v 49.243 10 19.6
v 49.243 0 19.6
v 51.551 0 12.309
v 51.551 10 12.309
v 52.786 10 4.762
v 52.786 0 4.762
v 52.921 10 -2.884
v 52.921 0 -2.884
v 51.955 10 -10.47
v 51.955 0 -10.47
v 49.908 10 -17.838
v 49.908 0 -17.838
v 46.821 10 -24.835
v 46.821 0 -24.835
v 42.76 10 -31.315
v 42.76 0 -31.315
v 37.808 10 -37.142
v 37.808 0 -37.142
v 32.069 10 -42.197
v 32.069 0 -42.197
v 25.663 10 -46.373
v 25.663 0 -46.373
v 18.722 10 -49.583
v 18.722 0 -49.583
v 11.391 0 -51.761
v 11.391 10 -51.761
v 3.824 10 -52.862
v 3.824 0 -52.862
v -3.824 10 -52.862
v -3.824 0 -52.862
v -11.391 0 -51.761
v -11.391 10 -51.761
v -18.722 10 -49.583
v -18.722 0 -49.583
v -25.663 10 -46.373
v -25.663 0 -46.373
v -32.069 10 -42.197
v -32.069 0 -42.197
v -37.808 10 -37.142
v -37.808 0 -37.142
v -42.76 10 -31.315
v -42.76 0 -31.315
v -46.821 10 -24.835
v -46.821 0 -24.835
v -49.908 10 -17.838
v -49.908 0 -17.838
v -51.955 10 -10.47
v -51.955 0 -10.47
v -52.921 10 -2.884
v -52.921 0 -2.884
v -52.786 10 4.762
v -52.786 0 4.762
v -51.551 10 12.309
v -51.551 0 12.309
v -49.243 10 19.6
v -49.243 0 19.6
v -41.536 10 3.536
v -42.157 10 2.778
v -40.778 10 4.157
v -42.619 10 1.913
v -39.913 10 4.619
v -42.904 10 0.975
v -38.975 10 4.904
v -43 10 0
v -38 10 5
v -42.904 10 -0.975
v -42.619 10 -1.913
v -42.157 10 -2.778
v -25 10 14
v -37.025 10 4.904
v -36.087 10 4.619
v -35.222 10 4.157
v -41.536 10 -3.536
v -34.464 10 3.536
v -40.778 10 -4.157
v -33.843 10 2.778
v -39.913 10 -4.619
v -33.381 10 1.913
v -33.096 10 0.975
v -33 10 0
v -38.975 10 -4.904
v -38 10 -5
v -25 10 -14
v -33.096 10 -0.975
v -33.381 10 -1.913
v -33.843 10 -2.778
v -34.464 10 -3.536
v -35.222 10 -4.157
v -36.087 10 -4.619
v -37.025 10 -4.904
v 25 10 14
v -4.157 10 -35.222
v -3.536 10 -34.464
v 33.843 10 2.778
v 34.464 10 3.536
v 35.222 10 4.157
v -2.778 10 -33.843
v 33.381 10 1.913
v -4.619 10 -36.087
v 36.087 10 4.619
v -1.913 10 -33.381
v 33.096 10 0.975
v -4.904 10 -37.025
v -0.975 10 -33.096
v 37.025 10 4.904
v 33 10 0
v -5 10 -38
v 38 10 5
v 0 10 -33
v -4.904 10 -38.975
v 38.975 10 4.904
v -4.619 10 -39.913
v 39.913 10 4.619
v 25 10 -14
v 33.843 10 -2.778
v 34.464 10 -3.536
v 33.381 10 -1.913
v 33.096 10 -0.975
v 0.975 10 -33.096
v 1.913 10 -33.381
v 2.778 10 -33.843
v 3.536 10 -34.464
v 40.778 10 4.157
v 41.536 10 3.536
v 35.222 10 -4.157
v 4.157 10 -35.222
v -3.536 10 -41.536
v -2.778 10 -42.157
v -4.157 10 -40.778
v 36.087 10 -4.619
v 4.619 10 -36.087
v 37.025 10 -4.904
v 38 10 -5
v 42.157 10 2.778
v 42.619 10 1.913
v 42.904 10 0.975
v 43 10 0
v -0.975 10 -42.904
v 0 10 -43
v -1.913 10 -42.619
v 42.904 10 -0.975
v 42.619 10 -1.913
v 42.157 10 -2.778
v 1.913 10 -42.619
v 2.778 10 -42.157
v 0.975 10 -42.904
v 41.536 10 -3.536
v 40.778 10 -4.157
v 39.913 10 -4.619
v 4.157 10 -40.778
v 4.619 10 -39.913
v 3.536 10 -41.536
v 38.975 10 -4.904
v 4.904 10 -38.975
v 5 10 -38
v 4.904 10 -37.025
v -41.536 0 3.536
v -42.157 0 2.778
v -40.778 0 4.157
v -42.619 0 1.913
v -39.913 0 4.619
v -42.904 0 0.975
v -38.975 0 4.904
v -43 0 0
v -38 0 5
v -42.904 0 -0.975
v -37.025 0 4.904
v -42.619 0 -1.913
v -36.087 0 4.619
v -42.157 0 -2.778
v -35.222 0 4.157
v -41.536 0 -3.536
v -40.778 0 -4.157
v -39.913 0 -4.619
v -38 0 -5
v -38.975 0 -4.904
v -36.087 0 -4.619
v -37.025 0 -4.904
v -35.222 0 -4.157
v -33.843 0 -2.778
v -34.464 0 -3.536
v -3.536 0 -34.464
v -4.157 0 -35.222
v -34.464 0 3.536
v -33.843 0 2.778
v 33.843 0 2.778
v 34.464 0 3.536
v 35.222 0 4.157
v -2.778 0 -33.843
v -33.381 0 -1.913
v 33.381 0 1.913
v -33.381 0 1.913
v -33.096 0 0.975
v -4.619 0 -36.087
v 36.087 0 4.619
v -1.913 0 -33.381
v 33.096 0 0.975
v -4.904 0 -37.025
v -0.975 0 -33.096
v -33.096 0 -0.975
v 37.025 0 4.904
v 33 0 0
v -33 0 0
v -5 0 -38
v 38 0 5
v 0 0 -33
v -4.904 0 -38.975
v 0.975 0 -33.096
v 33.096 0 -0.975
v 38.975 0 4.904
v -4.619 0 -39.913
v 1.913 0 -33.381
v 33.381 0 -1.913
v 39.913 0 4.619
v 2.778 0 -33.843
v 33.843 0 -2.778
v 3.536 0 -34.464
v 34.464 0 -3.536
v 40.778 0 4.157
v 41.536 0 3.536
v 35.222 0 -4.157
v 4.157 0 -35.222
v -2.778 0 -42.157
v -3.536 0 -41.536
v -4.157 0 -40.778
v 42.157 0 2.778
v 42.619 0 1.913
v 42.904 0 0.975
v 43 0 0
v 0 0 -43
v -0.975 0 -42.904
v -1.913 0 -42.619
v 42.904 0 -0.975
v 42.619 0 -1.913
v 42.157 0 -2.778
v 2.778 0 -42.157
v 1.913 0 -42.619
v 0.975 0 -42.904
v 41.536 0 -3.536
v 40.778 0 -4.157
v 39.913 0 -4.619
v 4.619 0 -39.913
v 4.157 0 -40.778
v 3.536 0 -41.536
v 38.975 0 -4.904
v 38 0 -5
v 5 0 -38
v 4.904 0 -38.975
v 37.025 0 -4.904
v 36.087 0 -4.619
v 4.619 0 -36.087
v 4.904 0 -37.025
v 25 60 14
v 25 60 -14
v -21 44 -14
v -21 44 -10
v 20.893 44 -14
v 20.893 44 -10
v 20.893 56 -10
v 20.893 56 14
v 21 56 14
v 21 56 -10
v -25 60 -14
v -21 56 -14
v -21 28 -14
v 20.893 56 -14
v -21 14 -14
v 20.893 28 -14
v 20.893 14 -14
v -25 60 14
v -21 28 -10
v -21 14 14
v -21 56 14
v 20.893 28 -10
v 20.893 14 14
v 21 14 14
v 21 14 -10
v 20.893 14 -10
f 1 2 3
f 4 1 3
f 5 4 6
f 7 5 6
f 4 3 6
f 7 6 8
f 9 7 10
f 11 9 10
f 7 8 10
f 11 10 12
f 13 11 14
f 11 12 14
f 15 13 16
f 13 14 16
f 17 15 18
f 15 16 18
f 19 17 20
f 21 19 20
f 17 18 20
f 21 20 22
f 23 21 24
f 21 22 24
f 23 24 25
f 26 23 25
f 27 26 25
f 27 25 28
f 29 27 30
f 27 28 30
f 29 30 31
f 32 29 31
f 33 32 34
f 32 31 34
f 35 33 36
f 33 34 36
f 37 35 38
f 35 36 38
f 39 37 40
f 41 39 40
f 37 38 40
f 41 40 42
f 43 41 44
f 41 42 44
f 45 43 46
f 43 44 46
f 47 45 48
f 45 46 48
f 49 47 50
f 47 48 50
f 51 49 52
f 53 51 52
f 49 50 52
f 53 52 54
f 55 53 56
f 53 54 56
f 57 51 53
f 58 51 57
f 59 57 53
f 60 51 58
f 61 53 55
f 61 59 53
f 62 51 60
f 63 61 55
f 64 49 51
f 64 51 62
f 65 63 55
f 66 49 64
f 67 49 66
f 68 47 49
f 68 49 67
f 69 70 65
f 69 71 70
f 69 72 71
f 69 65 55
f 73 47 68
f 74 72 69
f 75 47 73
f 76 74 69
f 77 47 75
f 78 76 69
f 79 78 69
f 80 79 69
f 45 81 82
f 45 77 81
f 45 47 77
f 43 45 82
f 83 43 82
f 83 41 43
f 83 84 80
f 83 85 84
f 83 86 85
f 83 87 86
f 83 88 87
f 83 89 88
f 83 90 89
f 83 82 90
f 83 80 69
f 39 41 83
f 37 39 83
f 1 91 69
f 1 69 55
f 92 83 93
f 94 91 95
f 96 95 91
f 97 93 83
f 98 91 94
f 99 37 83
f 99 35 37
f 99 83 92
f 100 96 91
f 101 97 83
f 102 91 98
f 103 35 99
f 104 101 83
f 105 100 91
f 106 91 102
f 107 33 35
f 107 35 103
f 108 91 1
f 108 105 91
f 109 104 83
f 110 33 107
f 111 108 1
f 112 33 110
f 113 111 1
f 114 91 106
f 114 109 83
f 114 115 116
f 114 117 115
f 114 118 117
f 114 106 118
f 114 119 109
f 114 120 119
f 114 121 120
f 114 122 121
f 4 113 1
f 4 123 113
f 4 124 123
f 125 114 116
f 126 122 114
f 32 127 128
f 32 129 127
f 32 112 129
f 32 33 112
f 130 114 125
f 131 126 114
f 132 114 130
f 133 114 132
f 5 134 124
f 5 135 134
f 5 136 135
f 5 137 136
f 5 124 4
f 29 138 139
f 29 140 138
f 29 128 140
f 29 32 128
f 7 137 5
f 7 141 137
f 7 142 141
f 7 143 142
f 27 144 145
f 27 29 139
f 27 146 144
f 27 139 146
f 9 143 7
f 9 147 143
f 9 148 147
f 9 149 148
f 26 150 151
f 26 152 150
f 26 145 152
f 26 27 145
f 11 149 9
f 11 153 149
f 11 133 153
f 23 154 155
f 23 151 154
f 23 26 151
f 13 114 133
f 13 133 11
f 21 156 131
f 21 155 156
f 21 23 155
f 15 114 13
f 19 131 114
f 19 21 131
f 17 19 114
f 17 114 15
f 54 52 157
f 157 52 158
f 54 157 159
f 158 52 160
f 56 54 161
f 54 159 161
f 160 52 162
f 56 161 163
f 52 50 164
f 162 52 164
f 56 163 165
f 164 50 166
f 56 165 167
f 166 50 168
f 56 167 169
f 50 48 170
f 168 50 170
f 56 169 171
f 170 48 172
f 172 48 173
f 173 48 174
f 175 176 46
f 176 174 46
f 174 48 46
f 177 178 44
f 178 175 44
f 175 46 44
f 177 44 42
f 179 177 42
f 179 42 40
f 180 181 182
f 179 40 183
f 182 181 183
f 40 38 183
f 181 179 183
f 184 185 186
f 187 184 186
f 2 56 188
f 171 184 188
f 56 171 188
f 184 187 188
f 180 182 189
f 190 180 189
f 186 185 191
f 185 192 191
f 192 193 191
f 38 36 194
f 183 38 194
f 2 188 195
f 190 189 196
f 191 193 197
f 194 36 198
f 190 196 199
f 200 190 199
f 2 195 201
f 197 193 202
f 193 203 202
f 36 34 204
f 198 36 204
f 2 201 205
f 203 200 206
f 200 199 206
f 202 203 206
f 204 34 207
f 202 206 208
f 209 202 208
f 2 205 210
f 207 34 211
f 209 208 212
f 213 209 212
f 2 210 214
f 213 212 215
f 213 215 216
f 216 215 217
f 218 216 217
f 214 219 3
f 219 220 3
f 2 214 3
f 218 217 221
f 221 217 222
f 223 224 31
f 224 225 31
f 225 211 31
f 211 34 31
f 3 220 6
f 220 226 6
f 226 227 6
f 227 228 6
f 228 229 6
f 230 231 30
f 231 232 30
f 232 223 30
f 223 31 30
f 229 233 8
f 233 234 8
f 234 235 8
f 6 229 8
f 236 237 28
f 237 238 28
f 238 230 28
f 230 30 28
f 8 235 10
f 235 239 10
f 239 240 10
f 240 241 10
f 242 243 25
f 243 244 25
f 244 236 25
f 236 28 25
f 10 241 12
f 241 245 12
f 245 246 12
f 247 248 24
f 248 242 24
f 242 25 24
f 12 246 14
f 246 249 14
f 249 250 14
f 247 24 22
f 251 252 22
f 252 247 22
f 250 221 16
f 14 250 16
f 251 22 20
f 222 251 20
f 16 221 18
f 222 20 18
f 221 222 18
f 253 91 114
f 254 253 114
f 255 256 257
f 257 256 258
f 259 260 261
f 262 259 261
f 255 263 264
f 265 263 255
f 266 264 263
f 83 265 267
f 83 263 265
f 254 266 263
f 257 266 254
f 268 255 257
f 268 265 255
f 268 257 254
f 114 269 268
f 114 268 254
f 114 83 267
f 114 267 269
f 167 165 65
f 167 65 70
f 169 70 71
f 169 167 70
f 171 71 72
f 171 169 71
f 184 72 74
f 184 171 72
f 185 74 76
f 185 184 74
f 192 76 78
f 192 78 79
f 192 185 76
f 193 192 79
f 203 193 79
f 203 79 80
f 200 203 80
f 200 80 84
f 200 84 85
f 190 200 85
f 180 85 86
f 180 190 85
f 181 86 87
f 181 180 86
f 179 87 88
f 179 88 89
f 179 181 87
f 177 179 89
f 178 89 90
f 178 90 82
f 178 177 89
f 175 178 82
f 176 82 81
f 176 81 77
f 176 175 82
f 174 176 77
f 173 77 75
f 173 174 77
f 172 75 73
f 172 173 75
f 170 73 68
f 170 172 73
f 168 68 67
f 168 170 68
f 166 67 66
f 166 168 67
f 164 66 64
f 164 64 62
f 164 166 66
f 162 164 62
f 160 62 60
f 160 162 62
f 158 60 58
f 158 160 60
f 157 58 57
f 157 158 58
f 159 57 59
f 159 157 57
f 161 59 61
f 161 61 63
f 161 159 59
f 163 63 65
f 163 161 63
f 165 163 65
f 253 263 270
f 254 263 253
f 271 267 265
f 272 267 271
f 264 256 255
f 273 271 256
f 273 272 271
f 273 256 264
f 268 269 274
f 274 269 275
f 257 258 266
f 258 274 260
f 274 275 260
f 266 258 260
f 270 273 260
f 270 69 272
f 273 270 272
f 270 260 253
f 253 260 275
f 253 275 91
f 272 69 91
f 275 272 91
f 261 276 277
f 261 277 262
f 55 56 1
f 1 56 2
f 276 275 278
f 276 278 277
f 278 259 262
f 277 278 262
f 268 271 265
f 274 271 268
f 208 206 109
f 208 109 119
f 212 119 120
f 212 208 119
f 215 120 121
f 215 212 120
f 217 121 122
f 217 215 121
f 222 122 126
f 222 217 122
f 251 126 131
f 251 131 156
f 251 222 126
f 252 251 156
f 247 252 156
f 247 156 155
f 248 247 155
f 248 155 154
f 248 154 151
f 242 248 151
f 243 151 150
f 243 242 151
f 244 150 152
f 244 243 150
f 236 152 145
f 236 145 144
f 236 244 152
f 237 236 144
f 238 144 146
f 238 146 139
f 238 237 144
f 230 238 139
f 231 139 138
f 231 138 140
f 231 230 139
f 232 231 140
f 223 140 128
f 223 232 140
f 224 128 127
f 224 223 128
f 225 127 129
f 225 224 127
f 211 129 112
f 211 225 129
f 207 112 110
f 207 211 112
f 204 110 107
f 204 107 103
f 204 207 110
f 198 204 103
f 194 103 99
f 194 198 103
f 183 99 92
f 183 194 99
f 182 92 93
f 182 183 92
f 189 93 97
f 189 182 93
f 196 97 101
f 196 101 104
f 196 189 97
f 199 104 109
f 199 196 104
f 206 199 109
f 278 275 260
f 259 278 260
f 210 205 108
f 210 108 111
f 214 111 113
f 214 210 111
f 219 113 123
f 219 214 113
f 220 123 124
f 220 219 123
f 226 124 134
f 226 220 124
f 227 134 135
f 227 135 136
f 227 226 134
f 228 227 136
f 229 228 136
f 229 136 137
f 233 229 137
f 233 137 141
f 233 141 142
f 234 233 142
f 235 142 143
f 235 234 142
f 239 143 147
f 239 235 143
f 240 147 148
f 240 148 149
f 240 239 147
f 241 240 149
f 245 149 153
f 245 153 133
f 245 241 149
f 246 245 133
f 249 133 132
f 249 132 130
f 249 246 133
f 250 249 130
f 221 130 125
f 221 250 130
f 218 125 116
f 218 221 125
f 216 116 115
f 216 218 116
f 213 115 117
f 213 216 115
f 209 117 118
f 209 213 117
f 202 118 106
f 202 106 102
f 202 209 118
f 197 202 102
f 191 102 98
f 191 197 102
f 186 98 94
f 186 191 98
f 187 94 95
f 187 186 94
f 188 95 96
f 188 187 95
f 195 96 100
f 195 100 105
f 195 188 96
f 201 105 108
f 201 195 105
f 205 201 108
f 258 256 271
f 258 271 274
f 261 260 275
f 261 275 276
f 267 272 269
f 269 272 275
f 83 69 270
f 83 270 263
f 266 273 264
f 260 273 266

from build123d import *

# Parameters (mm, degrees)
SKETCH1_R           = 5
BOSS_EXTRUDE4_DEPTH = 10
SKETCH5_W           = 50
SKETCH5_H           = 28
BOSS_EXTRUDE5_DEPTH = 50
SKETCH6_W           = 42
SKETCH6_H           = 42
BOSS_EXTRUDE7_DEPTH = 24
SKETCH9_W           = 41.892865088
SKETCH9_H           = 42
CUT_EXTRUDE1_DEPTH  = 24
SKETCH10_W          = 41.892865088
SKETCH10_H          = 12
CUT_EXTRUDE6_DEPTH  = 4
SKETCH11_W          = 41.892865088
SKETCH11_H          = 14
CUT_EXTRUDE7_DEPTH  = 4


with BuildPart() as part:
    # Sketch1 → Boss-Extrude4 (new body)
    with BuildSketch(Plane(origin=(0, 0, 0), x_dir=(1, 0, 0), z_dir=(0, 1, 0))):
        with BuildLine():
            Line((-49.242854308, -19.599522943), (49.242854308, -19.599522943))
            ThreePointArc((49.242854308, -19.599522943), (0, 53), (-49.242854308, -19.599522943))
        make_face()
        with Locations(Location((-38, 0, 0), (0, 0, 270))):
            Circle(SKETCH1_R, mode=Mode.SUBTRACT)
        with Locations(Location((38, 0, 0), (0, 0, 270))):
            Circle(SKETCH1_R, mode=Mode.SUBTRACT)
        with Locations(Location((0, 38, 0), (0, 0, 270))):
            Circle(SKETCH1_R, mode=Mode.SUBTRACT)
    extrude(amount=BOSS_EXTRUDE4_DEPTH)

    # Sketch5 → Boss-Extrude5 (add)
    with BuildSketch(Plane(origin=(0, 10, 0), x_dir=(1, 0, 0), z_dir=(0, 1, 0))):
        Rectangle(SKETCH5_W, SKETCH5_H)
    extrude(amount=BOSS_EXTRUDE5_DEPTH)


with BuildPart() as body_2:
    # Sketch6 → Boss-Extrude7 (new body)
    with BuildSketch(Plane.XY.offset(14)):
        with Locations((0, 35)):
            Rectangle(SKETCH6_W, SKETCH6_H)
    extrude(amount=-BOSS_EXTRUDE7_DEPTH)


with BuildPart() as cut_extrude1_tool:
    # Sketch9 → Cut-Extrude1 (new body)
    with BuildSketch(Plane.XY.offset(14)):
        with Locations((-0.053567456, 35)):
            Rectangle(SKETCH9_W, SKETCH9_H)
    extrude(amount=-CUT_EXTRUDE1_DEPTH)


with BuildPart() as part_1:
    add(part.part)

    # Cut-Extrude1: cut by cut_extrude1_tool
    add(cut_extrude1_tool.part, mode=Mode.SUBTRACT)

    # Sketch10 → Cut-Extrude6 (cut)
    with BuildSketch(Plane.XY.offset(-10)):
        with Locations((-0.053567456, 50)):
            Rectangle(SKETCH10_W, SKETCH10_H)
    extrude(amount=-CUT_EXTRUDE6_DEPTH, mode=Mode.SUBTRACT)

    # Sketch11 → Cut-Extrude7 (cut)
    with BuildSketch(Plane.XY.offset(-10)):
        with Locations((-0.053567456, 21)):
            Rectangle(SKETCH11_W, SKETCH11_H)
    extrude(amount=-CUT_EXTRUDE7_DEPTH, mode=Mode.SUBTRACT)


with BuildPart() as body_2_1:
    add(body_2.part)

    # Cut-Extrude1: cut by cut_extrude1_tool
    add(cut_extrude1_tool.part, mode=Mode.SUBTRACT)


solid = Compound([part_1.part, body_2_1.part])
